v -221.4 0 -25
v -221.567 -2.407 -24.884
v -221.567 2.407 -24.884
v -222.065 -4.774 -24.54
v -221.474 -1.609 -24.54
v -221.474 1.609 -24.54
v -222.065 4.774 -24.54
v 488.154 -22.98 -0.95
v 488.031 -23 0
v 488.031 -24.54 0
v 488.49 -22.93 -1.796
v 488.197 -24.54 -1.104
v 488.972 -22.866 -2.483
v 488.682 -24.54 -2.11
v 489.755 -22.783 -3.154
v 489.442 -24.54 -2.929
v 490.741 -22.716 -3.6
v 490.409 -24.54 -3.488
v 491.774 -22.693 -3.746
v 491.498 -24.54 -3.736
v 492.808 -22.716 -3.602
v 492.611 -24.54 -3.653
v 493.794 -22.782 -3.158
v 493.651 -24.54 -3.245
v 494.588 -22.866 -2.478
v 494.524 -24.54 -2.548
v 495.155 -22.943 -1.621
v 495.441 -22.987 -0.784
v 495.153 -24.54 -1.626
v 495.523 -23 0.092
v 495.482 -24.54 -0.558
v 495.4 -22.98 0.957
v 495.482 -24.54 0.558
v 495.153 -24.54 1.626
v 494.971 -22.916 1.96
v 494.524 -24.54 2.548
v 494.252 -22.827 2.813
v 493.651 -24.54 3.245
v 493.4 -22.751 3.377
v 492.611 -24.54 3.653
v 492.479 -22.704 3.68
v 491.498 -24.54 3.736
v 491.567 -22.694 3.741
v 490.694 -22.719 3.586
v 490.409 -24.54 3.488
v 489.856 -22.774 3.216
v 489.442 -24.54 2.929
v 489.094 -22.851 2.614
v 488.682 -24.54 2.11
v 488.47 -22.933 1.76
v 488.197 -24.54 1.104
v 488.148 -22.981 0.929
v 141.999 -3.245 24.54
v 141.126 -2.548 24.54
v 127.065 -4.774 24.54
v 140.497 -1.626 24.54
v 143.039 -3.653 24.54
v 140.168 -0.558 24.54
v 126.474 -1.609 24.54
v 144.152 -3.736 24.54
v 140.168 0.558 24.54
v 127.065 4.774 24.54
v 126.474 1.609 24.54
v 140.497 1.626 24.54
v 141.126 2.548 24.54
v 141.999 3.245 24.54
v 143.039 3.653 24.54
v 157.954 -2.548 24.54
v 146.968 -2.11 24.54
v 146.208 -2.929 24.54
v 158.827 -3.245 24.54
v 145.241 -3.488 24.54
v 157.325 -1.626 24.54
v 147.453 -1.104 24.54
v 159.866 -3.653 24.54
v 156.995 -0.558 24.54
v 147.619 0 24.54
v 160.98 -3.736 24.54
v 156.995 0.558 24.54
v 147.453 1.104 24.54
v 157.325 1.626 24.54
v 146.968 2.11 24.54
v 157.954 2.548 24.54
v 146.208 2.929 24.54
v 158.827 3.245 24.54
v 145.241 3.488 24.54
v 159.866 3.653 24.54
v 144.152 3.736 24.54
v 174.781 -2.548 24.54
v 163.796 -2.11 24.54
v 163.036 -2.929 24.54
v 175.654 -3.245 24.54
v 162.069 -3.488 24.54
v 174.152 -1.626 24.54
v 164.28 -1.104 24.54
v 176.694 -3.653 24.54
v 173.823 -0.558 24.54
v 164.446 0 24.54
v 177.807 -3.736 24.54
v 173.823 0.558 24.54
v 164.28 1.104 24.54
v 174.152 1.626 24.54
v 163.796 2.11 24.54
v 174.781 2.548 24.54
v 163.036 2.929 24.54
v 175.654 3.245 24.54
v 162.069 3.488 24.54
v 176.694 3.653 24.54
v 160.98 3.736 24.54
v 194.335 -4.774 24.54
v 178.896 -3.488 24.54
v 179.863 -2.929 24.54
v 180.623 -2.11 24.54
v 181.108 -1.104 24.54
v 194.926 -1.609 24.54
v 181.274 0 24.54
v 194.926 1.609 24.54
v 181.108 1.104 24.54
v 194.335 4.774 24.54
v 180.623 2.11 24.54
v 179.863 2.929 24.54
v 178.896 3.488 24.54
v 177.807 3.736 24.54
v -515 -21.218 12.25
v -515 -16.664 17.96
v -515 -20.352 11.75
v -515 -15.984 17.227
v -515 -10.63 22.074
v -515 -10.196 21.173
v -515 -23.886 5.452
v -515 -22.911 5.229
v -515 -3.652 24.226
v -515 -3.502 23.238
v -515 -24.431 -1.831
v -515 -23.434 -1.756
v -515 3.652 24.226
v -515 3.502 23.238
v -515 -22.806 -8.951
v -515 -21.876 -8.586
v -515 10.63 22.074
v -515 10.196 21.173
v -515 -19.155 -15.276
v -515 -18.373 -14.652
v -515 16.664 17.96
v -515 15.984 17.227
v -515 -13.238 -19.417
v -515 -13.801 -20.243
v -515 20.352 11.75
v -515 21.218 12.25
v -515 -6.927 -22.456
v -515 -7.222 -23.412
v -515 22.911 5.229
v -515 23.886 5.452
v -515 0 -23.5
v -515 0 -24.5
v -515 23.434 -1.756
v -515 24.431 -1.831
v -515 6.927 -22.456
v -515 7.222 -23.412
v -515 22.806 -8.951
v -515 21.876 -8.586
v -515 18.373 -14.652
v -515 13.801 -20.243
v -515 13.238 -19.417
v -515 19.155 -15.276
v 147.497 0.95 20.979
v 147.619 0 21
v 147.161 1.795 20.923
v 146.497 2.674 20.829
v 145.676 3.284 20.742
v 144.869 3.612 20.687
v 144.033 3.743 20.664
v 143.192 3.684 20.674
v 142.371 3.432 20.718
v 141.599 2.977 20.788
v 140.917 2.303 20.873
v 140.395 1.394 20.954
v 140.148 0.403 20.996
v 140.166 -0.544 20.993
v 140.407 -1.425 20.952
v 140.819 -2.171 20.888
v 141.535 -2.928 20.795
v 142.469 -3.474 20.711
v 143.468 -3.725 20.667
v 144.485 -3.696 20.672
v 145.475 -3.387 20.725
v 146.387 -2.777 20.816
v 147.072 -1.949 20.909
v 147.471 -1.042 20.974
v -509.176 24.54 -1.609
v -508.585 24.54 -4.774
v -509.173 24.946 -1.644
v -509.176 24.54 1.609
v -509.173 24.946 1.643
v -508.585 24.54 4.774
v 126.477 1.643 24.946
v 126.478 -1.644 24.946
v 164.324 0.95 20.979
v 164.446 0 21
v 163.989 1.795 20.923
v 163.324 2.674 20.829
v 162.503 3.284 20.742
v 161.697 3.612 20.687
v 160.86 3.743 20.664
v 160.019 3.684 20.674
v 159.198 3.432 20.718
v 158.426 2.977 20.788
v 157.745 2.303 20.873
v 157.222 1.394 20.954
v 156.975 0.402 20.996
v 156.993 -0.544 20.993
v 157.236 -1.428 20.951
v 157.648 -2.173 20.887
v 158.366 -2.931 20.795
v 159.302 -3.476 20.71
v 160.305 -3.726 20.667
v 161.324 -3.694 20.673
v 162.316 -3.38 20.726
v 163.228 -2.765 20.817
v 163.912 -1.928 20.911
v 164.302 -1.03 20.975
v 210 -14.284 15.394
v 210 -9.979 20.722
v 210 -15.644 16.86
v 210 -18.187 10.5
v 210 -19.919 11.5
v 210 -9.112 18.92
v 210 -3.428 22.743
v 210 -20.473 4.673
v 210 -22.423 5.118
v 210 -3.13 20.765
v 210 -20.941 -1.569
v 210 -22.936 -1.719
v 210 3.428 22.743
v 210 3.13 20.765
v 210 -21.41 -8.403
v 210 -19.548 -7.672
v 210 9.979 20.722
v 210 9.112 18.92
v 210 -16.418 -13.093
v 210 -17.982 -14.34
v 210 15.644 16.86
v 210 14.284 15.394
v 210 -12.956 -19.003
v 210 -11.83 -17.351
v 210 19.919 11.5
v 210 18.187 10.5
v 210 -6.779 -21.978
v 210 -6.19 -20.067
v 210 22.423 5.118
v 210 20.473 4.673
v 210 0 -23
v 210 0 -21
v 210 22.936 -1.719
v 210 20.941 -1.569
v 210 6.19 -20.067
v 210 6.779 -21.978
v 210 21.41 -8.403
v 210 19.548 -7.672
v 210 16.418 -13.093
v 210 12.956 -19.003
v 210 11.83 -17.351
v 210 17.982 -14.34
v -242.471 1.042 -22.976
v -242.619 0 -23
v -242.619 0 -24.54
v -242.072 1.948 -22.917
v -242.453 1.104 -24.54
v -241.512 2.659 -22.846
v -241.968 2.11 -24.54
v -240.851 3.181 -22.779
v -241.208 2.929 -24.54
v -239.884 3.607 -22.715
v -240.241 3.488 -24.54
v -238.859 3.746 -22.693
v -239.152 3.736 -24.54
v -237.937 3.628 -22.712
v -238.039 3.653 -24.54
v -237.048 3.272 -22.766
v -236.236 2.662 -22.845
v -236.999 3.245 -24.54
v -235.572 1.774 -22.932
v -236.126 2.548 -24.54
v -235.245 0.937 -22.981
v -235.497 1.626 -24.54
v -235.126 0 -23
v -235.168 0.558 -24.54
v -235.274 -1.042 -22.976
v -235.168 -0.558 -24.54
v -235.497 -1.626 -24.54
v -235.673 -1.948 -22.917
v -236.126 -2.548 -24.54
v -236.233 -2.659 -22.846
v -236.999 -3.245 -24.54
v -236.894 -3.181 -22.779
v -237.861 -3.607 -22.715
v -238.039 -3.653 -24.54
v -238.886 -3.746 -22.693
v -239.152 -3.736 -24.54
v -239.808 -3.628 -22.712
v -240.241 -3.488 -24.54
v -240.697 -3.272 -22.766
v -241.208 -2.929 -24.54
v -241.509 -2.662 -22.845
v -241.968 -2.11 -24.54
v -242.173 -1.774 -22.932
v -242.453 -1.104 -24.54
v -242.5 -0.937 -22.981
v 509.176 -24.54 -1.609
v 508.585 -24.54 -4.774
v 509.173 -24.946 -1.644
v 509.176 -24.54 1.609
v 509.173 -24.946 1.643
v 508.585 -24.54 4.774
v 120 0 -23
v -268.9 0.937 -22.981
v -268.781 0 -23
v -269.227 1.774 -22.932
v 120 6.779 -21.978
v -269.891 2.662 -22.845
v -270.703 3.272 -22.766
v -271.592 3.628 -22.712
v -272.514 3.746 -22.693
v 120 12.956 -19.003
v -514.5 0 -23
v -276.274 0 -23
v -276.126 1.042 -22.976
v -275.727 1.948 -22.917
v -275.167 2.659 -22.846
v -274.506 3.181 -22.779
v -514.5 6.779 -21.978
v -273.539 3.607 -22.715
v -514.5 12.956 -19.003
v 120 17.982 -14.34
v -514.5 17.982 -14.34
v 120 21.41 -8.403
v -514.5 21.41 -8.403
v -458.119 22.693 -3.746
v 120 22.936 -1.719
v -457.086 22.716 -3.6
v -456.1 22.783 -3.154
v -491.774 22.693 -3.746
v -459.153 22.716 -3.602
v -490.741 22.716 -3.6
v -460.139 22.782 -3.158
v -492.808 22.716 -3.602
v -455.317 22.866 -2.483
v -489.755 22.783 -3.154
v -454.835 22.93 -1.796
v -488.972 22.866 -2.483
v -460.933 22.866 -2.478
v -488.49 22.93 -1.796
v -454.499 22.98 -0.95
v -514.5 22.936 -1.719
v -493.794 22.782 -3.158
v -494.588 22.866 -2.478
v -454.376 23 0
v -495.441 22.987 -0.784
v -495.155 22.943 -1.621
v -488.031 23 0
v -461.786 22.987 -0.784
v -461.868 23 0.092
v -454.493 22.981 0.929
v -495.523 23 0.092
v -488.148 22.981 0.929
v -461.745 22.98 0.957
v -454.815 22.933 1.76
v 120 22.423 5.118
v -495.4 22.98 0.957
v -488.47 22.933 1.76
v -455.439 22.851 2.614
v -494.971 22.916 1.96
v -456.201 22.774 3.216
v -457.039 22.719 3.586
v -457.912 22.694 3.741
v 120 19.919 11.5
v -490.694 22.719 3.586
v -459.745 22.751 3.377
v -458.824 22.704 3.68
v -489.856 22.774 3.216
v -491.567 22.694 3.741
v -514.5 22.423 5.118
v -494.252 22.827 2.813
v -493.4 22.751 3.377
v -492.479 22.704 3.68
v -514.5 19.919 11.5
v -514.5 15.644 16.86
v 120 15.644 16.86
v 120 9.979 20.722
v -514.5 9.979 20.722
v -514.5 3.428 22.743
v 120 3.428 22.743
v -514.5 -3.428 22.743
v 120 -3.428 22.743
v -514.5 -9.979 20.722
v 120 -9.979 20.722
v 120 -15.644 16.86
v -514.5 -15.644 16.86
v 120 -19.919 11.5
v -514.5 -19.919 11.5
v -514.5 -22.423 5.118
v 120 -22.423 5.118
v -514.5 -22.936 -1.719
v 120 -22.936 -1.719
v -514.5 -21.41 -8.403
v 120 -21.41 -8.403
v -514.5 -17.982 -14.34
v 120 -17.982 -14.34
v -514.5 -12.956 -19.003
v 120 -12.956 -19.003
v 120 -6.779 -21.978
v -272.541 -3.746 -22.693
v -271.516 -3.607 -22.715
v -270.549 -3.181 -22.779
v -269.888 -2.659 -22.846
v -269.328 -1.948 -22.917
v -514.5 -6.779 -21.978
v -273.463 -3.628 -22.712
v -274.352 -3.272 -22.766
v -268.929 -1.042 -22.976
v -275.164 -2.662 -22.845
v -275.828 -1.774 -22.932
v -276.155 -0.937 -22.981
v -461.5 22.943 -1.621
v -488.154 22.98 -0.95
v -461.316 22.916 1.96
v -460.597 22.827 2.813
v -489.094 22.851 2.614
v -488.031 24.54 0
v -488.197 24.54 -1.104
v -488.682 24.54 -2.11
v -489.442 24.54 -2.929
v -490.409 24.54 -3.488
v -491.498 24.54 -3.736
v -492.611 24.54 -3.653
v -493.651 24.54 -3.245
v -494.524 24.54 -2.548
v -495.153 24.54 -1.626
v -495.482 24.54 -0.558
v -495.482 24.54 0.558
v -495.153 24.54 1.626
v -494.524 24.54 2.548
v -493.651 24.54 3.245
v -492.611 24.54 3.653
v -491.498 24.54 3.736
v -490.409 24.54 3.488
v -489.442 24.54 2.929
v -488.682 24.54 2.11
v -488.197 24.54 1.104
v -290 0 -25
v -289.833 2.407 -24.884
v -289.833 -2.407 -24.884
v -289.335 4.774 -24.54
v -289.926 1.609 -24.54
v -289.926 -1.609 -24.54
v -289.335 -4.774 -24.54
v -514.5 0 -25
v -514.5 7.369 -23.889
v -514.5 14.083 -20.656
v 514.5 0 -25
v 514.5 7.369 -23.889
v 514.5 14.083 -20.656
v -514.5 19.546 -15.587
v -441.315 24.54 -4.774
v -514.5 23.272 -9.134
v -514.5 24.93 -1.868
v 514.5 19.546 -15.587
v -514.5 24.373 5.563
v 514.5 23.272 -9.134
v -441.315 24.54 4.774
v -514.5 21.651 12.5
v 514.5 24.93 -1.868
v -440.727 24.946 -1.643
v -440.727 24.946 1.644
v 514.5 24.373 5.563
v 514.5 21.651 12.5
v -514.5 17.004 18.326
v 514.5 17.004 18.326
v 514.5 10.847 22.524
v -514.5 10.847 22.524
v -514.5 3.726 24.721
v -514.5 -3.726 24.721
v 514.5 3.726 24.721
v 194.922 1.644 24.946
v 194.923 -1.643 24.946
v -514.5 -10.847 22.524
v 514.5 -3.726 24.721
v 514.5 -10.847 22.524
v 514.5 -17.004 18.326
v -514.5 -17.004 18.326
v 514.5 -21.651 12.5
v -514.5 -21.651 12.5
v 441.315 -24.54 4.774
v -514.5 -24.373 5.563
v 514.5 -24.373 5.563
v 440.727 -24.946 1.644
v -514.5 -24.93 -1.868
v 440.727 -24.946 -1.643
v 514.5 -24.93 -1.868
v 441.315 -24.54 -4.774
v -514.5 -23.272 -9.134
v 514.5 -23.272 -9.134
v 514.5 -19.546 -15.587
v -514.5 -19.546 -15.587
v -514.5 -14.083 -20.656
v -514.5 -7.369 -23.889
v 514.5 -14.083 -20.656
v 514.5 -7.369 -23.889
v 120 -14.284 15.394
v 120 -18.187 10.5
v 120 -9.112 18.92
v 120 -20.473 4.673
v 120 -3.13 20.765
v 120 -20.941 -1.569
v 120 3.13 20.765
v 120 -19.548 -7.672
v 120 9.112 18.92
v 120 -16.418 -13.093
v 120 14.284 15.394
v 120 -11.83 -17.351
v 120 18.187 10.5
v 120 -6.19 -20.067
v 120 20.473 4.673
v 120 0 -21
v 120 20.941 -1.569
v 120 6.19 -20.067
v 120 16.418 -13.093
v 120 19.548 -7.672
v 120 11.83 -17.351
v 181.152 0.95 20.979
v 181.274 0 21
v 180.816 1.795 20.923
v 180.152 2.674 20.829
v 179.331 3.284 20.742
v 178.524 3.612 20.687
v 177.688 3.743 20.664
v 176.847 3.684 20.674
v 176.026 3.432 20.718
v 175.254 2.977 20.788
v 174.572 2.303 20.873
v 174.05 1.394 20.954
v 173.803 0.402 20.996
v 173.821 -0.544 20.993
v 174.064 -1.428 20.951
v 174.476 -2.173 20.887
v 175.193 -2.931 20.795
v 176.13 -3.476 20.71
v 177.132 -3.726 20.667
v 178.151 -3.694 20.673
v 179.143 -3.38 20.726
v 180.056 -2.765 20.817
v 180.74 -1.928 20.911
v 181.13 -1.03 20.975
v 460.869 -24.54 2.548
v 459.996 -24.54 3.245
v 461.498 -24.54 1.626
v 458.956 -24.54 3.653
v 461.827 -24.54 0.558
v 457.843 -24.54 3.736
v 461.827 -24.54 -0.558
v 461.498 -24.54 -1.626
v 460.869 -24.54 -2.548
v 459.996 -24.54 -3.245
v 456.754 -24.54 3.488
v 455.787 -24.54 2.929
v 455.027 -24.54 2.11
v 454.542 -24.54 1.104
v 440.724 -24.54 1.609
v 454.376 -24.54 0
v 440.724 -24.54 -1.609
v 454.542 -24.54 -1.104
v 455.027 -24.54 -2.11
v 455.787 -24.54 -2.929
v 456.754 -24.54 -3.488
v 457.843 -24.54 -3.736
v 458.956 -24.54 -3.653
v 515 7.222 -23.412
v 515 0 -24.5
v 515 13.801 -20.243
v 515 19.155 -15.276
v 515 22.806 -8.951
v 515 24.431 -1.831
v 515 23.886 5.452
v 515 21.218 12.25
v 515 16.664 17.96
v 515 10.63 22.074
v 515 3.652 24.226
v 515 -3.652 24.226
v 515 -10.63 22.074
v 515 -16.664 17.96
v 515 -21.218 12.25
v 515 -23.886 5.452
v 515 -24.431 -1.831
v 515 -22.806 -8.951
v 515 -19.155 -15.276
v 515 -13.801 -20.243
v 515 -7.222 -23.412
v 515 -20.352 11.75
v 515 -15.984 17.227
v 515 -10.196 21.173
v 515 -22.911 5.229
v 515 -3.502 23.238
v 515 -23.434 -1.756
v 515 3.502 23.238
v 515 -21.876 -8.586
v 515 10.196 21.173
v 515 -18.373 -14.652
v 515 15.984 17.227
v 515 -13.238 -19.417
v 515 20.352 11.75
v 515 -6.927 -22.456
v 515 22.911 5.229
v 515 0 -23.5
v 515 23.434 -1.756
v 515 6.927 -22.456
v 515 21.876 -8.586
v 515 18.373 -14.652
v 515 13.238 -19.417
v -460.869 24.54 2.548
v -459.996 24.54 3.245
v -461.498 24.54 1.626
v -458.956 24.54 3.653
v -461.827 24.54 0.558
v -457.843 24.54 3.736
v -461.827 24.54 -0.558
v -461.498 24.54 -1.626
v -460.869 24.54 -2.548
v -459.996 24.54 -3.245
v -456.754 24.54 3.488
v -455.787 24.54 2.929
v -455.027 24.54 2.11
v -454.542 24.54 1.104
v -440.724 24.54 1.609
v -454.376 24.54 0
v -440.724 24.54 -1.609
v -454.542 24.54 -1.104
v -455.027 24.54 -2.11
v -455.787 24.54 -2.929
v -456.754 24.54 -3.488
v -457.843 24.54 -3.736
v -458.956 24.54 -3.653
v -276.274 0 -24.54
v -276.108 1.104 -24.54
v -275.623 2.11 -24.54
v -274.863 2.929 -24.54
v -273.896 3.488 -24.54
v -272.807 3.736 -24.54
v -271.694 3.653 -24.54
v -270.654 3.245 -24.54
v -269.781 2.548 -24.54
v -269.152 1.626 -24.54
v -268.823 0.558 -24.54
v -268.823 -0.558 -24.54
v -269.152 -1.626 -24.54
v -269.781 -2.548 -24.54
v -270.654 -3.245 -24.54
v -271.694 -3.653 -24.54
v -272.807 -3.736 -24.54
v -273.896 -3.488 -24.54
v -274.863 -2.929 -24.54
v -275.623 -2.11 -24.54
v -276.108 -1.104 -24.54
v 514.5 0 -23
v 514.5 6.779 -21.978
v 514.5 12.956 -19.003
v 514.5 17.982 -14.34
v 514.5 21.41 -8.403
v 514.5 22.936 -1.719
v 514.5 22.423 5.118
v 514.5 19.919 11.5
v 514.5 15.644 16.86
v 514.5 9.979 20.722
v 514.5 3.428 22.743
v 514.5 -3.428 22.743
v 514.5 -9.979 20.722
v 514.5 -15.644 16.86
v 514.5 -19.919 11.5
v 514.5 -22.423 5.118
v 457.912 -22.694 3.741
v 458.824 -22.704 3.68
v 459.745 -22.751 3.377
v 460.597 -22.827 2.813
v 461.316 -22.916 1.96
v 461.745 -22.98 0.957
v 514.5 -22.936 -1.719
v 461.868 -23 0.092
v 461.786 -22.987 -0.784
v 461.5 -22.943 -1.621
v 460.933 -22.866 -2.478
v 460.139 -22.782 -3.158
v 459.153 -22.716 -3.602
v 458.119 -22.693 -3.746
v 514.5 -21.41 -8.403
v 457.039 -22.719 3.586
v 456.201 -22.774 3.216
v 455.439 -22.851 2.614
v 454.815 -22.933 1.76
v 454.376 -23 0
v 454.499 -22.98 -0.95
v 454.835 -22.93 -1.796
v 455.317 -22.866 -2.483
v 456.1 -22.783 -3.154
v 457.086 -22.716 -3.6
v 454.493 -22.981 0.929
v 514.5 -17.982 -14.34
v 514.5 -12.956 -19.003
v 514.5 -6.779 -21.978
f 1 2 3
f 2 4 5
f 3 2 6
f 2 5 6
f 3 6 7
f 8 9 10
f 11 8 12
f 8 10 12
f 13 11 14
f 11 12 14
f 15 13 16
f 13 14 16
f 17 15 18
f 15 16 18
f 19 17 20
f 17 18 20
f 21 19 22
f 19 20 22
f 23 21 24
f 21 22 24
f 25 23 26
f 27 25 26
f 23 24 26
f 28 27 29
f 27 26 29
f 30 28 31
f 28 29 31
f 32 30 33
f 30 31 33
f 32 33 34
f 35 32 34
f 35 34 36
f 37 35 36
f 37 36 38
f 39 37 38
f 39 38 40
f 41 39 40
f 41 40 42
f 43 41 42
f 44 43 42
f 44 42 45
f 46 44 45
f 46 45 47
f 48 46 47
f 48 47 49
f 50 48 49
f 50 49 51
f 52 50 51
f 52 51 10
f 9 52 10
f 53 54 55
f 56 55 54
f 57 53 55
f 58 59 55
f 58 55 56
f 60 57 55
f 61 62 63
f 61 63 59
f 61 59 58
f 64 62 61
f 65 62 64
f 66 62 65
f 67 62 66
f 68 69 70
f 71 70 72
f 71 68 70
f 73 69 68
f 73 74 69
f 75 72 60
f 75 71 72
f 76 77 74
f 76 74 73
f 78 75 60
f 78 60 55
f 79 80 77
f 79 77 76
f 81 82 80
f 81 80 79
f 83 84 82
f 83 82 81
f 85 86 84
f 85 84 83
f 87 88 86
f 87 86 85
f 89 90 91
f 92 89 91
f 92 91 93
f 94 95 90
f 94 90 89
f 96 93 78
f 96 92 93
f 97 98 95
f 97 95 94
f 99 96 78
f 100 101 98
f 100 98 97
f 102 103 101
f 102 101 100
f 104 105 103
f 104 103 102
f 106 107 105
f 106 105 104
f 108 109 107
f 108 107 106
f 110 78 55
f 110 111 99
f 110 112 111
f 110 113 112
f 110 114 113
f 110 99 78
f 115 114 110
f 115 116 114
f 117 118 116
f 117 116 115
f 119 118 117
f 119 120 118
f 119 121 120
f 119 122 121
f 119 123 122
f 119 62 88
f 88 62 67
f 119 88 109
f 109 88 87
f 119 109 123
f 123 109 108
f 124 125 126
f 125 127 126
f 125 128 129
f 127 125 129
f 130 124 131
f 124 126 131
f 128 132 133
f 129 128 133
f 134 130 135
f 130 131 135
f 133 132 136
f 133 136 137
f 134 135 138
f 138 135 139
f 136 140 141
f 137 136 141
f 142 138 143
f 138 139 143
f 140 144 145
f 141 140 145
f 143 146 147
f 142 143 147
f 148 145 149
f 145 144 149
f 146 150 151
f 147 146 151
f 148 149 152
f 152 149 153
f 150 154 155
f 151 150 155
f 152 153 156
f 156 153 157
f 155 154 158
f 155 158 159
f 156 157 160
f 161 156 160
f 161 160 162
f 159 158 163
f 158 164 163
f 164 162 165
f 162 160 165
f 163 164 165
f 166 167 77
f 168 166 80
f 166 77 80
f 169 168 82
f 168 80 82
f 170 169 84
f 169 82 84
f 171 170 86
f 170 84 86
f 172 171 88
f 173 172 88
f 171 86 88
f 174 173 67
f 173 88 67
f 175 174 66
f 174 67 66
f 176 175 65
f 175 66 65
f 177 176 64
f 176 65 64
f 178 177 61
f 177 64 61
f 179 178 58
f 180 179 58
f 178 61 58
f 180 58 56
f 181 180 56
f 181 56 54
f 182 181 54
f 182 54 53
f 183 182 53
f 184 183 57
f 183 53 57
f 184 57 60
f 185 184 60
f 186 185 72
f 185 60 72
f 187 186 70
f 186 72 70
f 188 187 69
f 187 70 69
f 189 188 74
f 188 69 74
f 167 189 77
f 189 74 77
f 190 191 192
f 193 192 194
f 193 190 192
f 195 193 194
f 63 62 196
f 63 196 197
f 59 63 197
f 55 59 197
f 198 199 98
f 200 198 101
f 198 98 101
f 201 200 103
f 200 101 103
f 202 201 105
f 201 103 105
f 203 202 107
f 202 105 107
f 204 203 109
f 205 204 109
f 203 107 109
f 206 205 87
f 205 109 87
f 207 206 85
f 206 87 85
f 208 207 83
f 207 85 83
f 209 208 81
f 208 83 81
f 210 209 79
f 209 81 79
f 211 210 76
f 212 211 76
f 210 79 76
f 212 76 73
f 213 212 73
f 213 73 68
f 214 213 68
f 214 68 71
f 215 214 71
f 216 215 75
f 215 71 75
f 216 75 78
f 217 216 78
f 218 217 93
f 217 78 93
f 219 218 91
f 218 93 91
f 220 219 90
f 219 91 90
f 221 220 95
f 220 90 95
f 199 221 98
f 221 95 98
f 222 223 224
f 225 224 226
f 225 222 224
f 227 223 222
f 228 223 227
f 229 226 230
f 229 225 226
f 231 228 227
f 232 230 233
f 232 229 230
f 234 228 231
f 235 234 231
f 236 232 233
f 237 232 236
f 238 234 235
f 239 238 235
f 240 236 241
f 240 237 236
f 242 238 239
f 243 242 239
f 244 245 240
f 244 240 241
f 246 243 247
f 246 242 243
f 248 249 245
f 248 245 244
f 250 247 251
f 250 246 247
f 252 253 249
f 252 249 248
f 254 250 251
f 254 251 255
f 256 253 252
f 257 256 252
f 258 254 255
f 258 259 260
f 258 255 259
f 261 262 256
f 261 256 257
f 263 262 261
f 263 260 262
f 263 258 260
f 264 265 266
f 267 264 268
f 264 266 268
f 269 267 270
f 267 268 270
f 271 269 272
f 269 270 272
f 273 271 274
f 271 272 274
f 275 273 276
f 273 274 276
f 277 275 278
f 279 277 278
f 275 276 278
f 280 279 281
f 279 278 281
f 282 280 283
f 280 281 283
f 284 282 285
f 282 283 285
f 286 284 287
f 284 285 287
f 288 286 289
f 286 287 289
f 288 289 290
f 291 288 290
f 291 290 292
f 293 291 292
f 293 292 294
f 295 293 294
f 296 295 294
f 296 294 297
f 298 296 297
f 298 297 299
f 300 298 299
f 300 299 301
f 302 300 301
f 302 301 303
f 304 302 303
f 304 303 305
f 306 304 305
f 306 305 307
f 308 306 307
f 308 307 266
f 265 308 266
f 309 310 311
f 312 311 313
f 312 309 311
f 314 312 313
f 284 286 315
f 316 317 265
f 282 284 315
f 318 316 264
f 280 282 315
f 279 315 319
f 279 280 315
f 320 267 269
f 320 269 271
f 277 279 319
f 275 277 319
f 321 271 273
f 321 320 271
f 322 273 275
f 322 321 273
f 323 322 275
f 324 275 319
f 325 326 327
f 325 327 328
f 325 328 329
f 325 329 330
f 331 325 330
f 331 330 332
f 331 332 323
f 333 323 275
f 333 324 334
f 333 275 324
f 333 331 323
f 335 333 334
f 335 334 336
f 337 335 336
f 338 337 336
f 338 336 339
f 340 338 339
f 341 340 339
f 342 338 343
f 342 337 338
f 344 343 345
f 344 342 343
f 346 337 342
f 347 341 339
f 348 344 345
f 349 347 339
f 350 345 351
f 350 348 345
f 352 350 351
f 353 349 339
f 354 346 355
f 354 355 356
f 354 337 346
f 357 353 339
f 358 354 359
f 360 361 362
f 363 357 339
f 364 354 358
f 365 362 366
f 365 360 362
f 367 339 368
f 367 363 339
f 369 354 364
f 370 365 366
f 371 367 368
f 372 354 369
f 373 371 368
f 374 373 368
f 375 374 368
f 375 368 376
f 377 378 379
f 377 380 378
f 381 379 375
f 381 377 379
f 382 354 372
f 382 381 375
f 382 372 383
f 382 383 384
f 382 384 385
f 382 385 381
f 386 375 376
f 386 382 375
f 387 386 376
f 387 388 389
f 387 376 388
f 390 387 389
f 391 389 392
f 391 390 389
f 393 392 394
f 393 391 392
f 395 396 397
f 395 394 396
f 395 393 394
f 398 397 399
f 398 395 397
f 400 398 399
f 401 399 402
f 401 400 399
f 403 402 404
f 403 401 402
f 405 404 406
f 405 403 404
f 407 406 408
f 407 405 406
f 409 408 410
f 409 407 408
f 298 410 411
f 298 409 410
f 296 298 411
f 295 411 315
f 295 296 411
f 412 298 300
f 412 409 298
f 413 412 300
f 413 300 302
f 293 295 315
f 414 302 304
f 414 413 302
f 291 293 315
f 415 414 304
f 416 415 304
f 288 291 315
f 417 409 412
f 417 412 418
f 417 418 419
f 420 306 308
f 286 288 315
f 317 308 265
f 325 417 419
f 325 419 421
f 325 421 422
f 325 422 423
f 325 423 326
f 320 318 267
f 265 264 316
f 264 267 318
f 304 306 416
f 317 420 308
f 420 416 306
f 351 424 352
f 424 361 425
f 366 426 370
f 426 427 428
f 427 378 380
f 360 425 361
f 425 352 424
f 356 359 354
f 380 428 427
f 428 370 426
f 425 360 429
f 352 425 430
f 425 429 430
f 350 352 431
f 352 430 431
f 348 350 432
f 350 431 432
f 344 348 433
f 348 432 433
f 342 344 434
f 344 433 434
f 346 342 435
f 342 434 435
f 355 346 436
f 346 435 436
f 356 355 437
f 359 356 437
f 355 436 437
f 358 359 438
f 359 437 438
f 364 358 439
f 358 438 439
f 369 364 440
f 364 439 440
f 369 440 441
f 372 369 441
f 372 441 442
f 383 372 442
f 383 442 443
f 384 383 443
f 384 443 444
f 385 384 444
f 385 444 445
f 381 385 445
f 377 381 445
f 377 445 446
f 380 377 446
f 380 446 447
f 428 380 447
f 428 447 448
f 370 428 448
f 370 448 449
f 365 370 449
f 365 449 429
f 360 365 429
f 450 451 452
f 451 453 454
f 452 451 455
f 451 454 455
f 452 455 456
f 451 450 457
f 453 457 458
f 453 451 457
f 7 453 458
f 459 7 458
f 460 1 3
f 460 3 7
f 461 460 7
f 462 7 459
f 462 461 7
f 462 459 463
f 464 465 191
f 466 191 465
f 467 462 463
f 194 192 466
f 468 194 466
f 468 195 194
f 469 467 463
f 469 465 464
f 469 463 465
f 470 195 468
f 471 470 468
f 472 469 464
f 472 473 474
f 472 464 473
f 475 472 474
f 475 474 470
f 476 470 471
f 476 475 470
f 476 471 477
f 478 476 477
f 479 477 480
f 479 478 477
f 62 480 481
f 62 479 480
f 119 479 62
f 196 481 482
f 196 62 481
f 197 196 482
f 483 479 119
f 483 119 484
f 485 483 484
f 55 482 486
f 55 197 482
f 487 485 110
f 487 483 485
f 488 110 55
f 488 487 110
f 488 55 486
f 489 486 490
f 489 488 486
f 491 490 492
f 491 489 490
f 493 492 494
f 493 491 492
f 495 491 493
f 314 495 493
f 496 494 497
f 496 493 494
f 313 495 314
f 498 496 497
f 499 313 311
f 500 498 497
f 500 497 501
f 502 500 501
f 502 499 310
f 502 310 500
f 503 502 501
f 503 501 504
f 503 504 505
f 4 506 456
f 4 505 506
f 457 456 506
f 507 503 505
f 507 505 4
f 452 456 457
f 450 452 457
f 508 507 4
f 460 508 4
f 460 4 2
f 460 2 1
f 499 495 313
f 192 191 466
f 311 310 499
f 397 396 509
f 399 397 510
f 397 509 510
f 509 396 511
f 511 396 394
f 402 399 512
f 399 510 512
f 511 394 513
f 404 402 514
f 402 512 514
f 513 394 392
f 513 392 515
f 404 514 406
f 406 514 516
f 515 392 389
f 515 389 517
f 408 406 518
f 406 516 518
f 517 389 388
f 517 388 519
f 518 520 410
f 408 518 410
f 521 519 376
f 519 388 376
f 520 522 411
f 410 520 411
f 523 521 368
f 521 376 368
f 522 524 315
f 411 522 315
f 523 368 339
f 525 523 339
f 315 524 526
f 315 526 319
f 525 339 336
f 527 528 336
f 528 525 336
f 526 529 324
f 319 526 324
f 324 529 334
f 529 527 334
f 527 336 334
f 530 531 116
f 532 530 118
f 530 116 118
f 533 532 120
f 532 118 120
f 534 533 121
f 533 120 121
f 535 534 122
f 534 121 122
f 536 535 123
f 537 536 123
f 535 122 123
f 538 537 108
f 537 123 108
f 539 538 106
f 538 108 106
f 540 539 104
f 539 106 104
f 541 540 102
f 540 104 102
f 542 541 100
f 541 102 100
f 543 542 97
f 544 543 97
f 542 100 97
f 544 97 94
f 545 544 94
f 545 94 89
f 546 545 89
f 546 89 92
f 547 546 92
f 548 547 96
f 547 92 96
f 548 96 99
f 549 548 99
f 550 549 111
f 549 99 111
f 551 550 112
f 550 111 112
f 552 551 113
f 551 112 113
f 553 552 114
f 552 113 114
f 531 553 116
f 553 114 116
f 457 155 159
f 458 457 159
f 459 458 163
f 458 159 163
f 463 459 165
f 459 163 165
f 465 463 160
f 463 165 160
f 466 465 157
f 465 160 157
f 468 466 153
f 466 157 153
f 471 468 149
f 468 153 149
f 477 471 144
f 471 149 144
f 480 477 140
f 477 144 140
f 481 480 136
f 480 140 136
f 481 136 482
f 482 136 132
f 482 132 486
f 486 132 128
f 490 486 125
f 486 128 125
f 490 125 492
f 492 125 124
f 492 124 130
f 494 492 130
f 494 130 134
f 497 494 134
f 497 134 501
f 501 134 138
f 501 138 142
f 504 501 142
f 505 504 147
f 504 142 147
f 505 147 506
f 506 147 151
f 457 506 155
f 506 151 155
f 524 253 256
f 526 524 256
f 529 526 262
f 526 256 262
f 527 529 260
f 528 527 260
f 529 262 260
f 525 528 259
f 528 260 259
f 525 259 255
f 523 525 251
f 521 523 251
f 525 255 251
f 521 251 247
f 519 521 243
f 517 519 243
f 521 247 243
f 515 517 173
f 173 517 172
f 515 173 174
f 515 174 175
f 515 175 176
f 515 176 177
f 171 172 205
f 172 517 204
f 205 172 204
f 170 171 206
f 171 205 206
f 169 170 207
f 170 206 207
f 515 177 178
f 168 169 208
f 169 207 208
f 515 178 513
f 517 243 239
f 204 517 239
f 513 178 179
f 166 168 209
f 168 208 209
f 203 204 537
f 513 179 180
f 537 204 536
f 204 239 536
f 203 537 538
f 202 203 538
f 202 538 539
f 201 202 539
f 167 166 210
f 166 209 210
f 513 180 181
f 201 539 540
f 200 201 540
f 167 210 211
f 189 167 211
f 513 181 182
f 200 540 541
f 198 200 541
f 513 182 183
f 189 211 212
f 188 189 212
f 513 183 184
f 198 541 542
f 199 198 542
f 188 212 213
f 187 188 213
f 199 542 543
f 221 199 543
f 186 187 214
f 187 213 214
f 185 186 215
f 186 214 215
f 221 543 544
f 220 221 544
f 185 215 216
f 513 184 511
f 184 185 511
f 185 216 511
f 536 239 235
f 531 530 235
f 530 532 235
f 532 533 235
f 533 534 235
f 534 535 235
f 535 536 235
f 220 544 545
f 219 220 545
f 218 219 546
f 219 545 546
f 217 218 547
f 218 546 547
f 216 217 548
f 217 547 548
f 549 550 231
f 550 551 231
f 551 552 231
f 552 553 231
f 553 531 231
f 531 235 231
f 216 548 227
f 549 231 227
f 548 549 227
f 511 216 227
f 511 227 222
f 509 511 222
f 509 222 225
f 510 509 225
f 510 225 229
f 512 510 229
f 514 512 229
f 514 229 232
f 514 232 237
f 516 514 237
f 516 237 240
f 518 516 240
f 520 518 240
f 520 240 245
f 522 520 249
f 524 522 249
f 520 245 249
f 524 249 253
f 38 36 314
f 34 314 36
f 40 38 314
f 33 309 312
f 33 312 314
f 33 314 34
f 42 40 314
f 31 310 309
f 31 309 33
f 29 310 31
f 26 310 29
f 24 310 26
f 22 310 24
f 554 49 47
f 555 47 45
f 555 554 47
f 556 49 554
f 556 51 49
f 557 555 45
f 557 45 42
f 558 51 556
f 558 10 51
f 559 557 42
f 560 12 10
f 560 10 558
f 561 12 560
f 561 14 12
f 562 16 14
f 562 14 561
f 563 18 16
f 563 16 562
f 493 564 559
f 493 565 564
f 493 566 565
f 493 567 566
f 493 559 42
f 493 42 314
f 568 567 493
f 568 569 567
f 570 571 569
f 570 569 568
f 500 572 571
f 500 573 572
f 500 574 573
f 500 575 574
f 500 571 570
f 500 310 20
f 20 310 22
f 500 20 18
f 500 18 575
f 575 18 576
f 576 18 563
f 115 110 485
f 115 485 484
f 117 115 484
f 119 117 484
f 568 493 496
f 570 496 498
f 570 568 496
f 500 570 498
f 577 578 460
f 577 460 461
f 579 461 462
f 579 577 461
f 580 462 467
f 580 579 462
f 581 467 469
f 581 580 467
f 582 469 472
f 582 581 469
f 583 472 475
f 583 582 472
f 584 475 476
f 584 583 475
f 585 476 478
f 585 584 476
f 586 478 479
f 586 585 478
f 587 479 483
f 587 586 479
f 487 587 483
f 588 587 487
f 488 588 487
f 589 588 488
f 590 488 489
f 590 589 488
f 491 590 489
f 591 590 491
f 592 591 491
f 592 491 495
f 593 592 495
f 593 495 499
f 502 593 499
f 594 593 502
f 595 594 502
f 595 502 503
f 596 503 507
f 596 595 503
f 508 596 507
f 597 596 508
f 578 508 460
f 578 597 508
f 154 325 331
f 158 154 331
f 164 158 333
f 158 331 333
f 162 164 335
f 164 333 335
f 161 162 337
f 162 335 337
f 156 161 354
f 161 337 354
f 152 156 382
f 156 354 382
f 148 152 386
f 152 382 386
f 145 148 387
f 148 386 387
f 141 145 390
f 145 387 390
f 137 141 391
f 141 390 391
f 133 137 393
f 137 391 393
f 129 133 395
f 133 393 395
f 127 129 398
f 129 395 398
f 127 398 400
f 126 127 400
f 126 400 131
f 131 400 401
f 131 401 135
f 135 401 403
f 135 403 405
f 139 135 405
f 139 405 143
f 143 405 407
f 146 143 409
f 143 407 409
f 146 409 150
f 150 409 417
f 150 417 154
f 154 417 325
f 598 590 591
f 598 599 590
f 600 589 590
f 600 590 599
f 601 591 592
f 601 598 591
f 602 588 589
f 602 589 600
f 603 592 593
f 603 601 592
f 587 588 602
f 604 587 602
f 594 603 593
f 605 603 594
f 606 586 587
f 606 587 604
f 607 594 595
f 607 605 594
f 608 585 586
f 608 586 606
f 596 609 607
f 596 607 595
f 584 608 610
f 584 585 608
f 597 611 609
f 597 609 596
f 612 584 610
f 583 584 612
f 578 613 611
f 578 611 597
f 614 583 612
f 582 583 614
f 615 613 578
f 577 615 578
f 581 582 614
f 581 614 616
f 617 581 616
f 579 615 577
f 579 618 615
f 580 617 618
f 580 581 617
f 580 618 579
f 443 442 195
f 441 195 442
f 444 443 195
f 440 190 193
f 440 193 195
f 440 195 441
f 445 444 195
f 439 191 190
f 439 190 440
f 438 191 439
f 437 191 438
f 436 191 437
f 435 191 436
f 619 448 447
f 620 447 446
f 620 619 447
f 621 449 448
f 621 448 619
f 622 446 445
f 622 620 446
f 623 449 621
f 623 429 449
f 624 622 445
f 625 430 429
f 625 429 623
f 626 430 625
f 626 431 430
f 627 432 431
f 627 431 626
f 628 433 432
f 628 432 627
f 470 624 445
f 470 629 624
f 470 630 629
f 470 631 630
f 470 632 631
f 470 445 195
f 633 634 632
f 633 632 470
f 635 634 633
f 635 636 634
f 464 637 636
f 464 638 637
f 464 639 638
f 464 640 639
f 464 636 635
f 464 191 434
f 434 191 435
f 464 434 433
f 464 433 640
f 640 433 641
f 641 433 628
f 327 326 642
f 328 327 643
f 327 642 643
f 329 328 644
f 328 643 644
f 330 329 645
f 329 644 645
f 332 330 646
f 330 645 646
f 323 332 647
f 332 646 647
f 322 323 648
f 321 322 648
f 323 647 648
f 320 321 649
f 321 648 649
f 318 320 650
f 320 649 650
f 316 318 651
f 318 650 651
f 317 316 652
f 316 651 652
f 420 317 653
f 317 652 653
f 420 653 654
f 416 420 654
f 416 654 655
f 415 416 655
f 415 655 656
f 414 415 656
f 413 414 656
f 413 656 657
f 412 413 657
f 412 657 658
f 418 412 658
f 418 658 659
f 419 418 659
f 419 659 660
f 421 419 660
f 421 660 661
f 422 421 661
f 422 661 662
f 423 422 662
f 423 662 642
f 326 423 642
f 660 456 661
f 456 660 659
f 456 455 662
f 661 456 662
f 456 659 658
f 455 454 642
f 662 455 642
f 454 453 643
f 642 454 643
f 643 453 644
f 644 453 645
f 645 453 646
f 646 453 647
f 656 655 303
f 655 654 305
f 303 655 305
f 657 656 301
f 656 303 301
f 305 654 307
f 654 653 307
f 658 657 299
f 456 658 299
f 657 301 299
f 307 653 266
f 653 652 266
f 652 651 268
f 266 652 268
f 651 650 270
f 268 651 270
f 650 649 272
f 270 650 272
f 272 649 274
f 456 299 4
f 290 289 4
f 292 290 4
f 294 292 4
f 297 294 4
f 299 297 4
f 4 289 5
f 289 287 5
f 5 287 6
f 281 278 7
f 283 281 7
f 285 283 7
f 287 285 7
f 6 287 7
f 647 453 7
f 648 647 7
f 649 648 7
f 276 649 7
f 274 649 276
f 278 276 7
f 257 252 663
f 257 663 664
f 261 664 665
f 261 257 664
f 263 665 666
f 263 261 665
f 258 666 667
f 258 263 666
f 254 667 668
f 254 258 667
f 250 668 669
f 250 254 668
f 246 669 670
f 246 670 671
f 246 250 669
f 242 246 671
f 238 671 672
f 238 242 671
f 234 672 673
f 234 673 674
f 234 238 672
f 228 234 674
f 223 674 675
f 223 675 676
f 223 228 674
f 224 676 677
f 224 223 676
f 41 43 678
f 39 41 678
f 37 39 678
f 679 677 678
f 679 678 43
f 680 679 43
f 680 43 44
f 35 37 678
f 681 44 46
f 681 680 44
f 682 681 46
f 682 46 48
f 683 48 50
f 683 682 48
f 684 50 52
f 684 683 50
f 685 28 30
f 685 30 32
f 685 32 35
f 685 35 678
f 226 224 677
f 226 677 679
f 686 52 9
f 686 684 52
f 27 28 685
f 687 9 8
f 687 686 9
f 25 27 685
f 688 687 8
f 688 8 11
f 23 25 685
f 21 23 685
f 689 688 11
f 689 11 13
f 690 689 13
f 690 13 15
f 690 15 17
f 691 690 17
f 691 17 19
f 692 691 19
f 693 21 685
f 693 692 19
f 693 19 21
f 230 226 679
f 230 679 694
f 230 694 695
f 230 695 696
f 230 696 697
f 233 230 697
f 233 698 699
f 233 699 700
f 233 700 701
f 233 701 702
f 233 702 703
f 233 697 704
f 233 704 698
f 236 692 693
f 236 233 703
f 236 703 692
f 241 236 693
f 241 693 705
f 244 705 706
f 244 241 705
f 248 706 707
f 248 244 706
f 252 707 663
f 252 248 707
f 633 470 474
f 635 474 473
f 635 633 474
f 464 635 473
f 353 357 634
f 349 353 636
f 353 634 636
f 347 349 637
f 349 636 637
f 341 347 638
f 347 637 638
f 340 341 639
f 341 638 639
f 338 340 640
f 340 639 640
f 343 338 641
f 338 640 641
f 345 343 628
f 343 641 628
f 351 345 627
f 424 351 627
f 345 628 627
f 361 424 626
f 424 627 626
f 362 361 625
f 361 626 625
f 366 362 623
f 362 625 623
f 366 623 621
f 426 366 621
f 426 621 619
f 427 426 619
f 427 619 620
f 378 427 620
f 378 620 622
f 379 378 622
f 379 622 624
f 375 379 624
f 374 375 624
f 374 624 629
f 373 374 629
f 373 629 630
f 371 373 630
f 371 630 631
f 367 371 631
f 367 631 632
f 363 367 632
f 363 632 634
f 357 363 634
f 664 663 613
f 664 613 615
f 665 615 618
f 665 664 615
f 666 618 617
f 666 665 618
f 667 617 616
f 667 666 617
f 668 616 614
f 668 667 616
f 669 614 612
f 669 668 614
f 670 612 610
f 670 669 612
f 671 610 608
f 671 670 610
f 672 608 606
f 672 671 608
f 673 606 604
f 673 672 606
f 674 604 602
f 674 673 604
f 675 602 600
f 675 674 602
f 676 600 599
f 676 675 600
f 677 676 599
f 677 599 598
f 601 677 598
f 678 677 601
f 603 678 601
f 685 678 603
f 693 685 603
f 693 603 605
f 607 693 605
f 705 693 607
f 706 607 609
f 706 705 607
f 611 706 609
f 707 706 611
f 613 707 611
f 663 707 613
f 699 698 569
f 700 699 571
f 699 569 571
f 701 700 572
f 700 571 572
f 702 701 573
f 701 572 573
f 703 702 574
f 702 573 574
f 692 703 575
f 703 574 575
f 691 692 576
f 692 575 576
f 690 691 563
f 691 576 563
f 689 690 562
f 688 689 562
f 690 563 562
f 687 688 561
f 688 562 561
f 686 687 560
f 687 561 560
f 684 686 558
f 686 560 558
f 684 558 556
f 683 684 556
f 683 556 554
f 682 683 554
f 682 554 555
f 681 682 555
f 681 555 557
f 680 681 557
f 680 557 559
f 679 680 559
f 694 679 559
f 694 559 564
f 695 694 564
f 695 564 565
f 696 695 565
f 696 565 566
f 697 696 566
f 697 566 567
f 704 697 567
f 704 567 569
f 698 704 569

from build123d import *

# Parameters (mm, degrees)
SKETCH1_R                     = 25
SKETCH1_R_2                   = 23
EXTRUDE_THIN1_DEPTH           = 515
EXTRUDE_THIN2_START           = 210
SKETCH1_3_R                   = 25
SKETCH1_3_R_2                 = 21
EXTRUDE_THIN2_DEPTH           = 90
CUT_EXTRUDE1_START            = 24.54
CUT_EXTRUDE1_DEPTH            = 492.672165684
CUT_EXTRUDE2_START            = -24.54
CUT_EXTRUDE2_DEPTH            = 492.672165793
CUT_EXTRUDE3_START            = -24.54
CUT_EXTRUDE3_DEPTH            = 492.672165793
CUT_EXTRUDE4_START            = 24.54
CUT_EXTRUDE4_DEPTH            = 492.672165793
M_0_295_DIAMETER_HOLE3_REACH  = 519.981
M_0_295_DIAMETER_HOLE3_BORE_R = 3.7465
M_0_295_DIAMETER_HOLE4_REACH  = 519.981
M_0_295_DIAMETER_HOLE4_BORE_R = 3.7465
M_0_295_DIAMETER_HOLE5_REACH  = 519.981
M_0_295_DIAMETER_HOLE5_BORE_R = 3.7465
M_0_295_DIAMETER_HOLE6_REACH  = 519.981
M_0_295_DIAMETER_HOLE6_BORE_R = 3.7465
CHAMFER1_SIZE                 = 0.5


with BuildPart() as part:
    # Sketch1 → Extrude-Thin1 (new, symmetric)
    with BuildSketch(Plane(origin=(0, 0, 0), x_dir=(0, 0, -1), z_dir=(1, 0, 0))):
        Circle(SKETCH1_R)
        Circle(SKETCH1_R_2, mode=Mode.SUBTRACT)
    extrude(amount=EXTRUDE_THIN1_DEPTH, both=True)

    # Sketch1<3> → Extrude-Thin2 (add)
    with BuildSketch(Plane(origin=(0, 0, 0), x_dir=(0, 0, -1), z_dir=(1, 0, 0)).offset(EXTRUDE_THIN2_START)):
        Circle(SKETCH1_3_R)
        Circle(SKETCH1_3_R_2, mode=Mode.SUBTRACT)
    extrude(amount=-EXTRUDE_THIN2_DEPTH)

    # Sketch3 → Cut-Extrude1 (cut, through all)
    with BuildSketch(Plane(origin=(0, 0, 0), x_dir=(1, 0, 0), z_dir=(0, 1, 0)).offset(CUT_EXTRUDE1_START)):
        with BuildLine():
            Line((-491.7775, -17.4725), (-458.1225, -17.4725))
            ThreePointArc((-458.1225, -17.4725), (-440.65, 0), (-458.1225, 17.4725))
            Line((-458.1225, 17.4725), (-491.7775, 17.4725))
            ThreePointArc((-491.7775, 17.4725), (-509.25, 0), (-491.7775, -17.4725))
        make_face()
    extrude(amount=CUT_EXTRUDE1_DEPTH, mode=Mode.SUBTRACT)

    # Sketch8 → Cut-Extrude2 (cut, through all)
    with BuildSketch(Plane.XY.offset(CUT_EXTRUDE2_START)):
        with BuildLine():
            Line((-272.5275, -17.4725), (-238.8725, -17.4725))
            ThreePointArc((-238.8725, -17.4725), (-221.4, 0), (-238.8725, 17.4725))
            Line((-238.8725, 17.4725), (-272.5275, 17.4725))
            ThreePointArc((-272.5275, 17.4725), (-290, 0), (-272.5275, -17.4725))
        make_face()
    extrude(amount=-CUT_EXTRUDE2_DEPTH, mode=Mode.SUBTRACT)

    # Sketch3<3> → Cut-Extrude3 (cut, through all)
    with BuildSketch(Plane(origin=(0, 0, 0), x_dir=(1, 0, 0), z_dir=(0, 1, 0)).offset(CUT_EXTRUDE3_START)):
        with BuildLine():
            ThreePointArc((458.1225, -17.4725), (440.65, 0), (458.1225, 17.4725))
            Line((458.1225, 17.4725), (491.7775, 17.4725))
            ThreePointArc((491.7775, 17.4725), (509.25, 0), (491.7775, -17.4725))
            Line((491.7775, -17.4725), (458.1225, -17.4725))
        make_face()
    extrude(amount=-CUT_EXTRUDE3_DEPTH, mode=Mode.SUBTRACT)

    # Sketch8<4> → Cut-Extrude4 (cut, through all)
    with BuildSketch(Plane.XY.offset(CUT_EXTRUDE4_START)):
        with BuildLine():
            Line((143.8725, -17.4725), (177.5275, -17.4725))
            ThreePointArc((177.5275, -17.4725), (195, 0), (177.5275, 17.4725))
            Line((177.5275, 17.4725), (143.8725, 17.4725))
            ThreePointArc((143.8725, 17.4725), (126.4, 0), (143.8725, -17.4725))
        make_face()
    extrude(amount=CUT_EXTRUDE4_DEPTH, mode=Mode.SUBTRACT)

    # M (0.295) Diameter Hole3 bore → M (0.295) Diameter Hole3 (cut, up to next)
    with BuildSketch(Plane(origin=(0, 24.54, 0), x_dir=(1, 0, 0), z_dir=(0, 1, 0)), mode=Mode.PRIVATE) as m_0_295_diameter_hole3_sk1:
        with Locations((-491.7775, 0)):
            Circle(M_0_295_DIAMETER_HOLE3_BORE_R)
    m_0_295_diameter_hole3_tool1 = extrude(m_0_295_diameter_hole3_sk1.sketch, amount=-M_0_295_DIAMETER_HOLE3_REACH, mode=Mode.PRIVATE) & part.part
    # M (0.295) Diameter Hole3 bore → M (0.295) Diameter Hole3 (cut, up to next)
    with BuildSketch(Plane(origin=(0, 24.54, 0), x_dir=(1, 0, 0), z_dir=(0, 1, 0)), mode=Mode.PRIVATE) as m_0_295_diameter_hole3_sk2:
        with Locations((-458.1225, 0)):
            Circle(M_0_295_DIAMETER_HOLE3_BORE_R)
    m_0_295_diameter_hole3_tool2 = extrude(m_0_295_diameter_hole3_sk2.sketch, amount=-M_0_295_DIAMETER_HOLE3_REACH, mode=Mode.PRIVATE) & part.part
    add(m_0_295_diameter_hole3_tool1.solids().sort_by_distance((-491.7775, 24.54, 0))[0], mode=Mode.SUBTRACT)
    add(m_0_295_diameter_hole3_tool2.solids().sort_by_distance((-458.1225, 24.54, 0))[0], mode=Mode.SUBTRACT)

    # M (0.295) Diameter Hole4 bore → M (0.295) Diameter Hole4 (cut, up to next)
    with BuildSketch(Plane(origin=(0, 0, -24.54), x_dir=(-1, 0, 0), z_dir=(0, 0, -1)), mode=Mode.PRIVATE) as m_0_295_diameter_hole4_sk1:
        with Locations((238.8725, 0)):
            Circle(M_0_295_DIAMETER_HOLE4_BORE_R)
    m_0_295_diameter_hole4_tool1 = extrude(m_0_295_diameter_hole4_sk1.sketch, amount=-M_0_295_DIAMETER_HOLE4_REACH, mode=Mode.PRIVATE) & part.part
    # M (0.295) Diameter Hole4 bore → M (0.295) Diameter Hole4 (cut, up to next)
    with BuildSketch(Plane(origin=(0, 0, -24.54), x_dir=(-1, 0, 0), z_dir=(0, 0, -1)), mode=Mode.PRIVATE) as m_0_295_diameter_hole4_sk2:
        with Locations((272.5275, 0)):
            Circle(M_0_295_DIAMETER_HOLE4_BORE_R)
    m_0_295_diameter_hole4_tool2 = extrude(m_0_295_diameter_hole4_sk2.sketch, amount=-M_0_295_DIAMETER_HOLE4_REACH, mode=Mode.PRIVATE) & part.part
    add(m_0_295_diameter_hole4_tool1.solids().sort_by_distance((-238.8725, 0, -24.54))[0], mode=Mode.SUBTRACT)
    add(m_0_295_diameter_hole4_tool2.solids().sort_by_distance((-272.5275, 0, -24.54))[0], mode=Mode.SUBTRACT)

    # M (0.295) Diameter Hole5 bore → M (0.295) Diameter Hole5 (cut, up to next)
    with BuildSketch(Plane.XY.offset(24.54), mode=Mode.PRIVATE) as m_0_295_diameter_hole5_sk1:
        with Locations((143.8725, 0)):
            Circle(M_0_295_DIAMETER_HOLE5_BORE_R)
    m_0_295_diameter_hole5_tool1 = extrude(m_0_295_diameter_hole5_sk1.sketch, amount=-M_0_295_DIAMETER_HOLE5_REACH, mode=Mode.PRIVATE) & part.part
    # M (0.295) Diameter Hole5 bore → M (0.295) Diameter Hole5 (cut, up to next)
    with BuildSketch(Plane.XY.offset(24.54), mode=Mode.PRIVATE) as m_0_295_diameter_hole5_sk2:
        with Locations((160.7, 0)):
            Circle(M_0_295_DIAMETER_HOLE5_BORE_R)
    m_0_295_diameter_hole5_tool2 = extrude(m_0_295_diameter_hole5_sk2.sketch, amount=-M_0_295_DIAMETER_HOLE5_REACH, mode=Mode.PRIVATE) & part.part
    # M (0.295) Diameter Hole5 bore → M (0.295) Diameter Hole5 (cut, up to next)
    with BuildSketch(Plane.XY.offset(24.54), mode=Mode.PRIVATE) as m_0_295_diameter_hole5_sk3:
        with Locations((177.5275, 0)):
            Circle(M_0_295_DIAMETER_HOLE5_BORE_R)
    m_0_295_diameter_hole5_tool3 = extrude(m_0_295_diameter_hole5_sk3.sketch, amount=-M_0_295_DIAMETER_HOLE5_REACH, mode=Mode.PRIVATE) & part.part
    add(m_0_295_diameter_hole5_tool1.solids().sort_by_distance((143.8725, 0, 24.54))[0], mode=Mode.SUBTRACT)
    add(m_0_295_diameter_hole5_tool2.solids().sort_by_distance((160.7, 0, 24.54))[0], mode=Mode.SUBTRACT)
    add(m_0_295_diameter_hole5_tool3.solids().sort_by_distance((177.5275, 0, 24.54))[0], mode=Mode.SUBTRACT)

    # M (0.295) Diameter Hole6 bore → M (0.295) Diameter Hole6 (cut, up to next)
    with BuildSketch(Plane(origin=(0, -24.54, 0), x_dir=(-1, 0, 0), z_dir=(0, -1, 0)), mode=Mode.PRIVATE) as m_0_295_diameter_hole6_sk1:
        with Locations((-491.7775, 0)):
            Circle(M_0_295_DIAMETER_HOLE6_BORE_R)
    m_0_295_diameter_hole6_tool1 = extrude(m_0_295_diameter_hole6_sk1.sketch, amount=-M_0_295_DIAMETER_HOLE6_REACH, mode=Mode.PRIVATE) & part.part
    # M (0.295) Diameter Hole6 bore → M (0.295) Diameter Hole6 (cut, up to next)
    with BuildSketch(Plane(origin=(0, -24.54, 0), x_dir=(-1, 0, 0), z_dir=(0, -1, 0)), mode=Mode.PRIVATE) as m_0_295_diameter_hole6_sk2:
        with Locations((-458.1225, 0)):
            Circle(M_0_295_DIAMETER_HOLE6_BORE_R)
    m_0_295_diameter_hole6_tool2 = extrude(m_0_295_diameter_hole6_sk2.sketch, amount=-M_0_295_DIAMETER_HOLE6_REACH, mode=Mode.PRIVATE) & part.part
    add(m_0_295_diameter_hole6_tool1.solids().sort_by_distance((491.7775, -24.54, 0))[0], mode=Mode.SUBTRACT)
    add(m_0_295_diameter_hole6_tool2.solids().sort_by_distance((458.1225, -24.54, 0))[0], mode=Mode.SUBTRACT)

    # Chamfer1
    chamfer1_edges = [part.edges().sort_by_distance(p)[0] for p in [
        (-515, 0, 25),
        (-515, 0, 23),
        (515, 0, 25),
        (515, 0, 23),
    ]]
    chamfer(chamfer1_edges, length=CHAMFER1_SIZE)


solid = part.part
